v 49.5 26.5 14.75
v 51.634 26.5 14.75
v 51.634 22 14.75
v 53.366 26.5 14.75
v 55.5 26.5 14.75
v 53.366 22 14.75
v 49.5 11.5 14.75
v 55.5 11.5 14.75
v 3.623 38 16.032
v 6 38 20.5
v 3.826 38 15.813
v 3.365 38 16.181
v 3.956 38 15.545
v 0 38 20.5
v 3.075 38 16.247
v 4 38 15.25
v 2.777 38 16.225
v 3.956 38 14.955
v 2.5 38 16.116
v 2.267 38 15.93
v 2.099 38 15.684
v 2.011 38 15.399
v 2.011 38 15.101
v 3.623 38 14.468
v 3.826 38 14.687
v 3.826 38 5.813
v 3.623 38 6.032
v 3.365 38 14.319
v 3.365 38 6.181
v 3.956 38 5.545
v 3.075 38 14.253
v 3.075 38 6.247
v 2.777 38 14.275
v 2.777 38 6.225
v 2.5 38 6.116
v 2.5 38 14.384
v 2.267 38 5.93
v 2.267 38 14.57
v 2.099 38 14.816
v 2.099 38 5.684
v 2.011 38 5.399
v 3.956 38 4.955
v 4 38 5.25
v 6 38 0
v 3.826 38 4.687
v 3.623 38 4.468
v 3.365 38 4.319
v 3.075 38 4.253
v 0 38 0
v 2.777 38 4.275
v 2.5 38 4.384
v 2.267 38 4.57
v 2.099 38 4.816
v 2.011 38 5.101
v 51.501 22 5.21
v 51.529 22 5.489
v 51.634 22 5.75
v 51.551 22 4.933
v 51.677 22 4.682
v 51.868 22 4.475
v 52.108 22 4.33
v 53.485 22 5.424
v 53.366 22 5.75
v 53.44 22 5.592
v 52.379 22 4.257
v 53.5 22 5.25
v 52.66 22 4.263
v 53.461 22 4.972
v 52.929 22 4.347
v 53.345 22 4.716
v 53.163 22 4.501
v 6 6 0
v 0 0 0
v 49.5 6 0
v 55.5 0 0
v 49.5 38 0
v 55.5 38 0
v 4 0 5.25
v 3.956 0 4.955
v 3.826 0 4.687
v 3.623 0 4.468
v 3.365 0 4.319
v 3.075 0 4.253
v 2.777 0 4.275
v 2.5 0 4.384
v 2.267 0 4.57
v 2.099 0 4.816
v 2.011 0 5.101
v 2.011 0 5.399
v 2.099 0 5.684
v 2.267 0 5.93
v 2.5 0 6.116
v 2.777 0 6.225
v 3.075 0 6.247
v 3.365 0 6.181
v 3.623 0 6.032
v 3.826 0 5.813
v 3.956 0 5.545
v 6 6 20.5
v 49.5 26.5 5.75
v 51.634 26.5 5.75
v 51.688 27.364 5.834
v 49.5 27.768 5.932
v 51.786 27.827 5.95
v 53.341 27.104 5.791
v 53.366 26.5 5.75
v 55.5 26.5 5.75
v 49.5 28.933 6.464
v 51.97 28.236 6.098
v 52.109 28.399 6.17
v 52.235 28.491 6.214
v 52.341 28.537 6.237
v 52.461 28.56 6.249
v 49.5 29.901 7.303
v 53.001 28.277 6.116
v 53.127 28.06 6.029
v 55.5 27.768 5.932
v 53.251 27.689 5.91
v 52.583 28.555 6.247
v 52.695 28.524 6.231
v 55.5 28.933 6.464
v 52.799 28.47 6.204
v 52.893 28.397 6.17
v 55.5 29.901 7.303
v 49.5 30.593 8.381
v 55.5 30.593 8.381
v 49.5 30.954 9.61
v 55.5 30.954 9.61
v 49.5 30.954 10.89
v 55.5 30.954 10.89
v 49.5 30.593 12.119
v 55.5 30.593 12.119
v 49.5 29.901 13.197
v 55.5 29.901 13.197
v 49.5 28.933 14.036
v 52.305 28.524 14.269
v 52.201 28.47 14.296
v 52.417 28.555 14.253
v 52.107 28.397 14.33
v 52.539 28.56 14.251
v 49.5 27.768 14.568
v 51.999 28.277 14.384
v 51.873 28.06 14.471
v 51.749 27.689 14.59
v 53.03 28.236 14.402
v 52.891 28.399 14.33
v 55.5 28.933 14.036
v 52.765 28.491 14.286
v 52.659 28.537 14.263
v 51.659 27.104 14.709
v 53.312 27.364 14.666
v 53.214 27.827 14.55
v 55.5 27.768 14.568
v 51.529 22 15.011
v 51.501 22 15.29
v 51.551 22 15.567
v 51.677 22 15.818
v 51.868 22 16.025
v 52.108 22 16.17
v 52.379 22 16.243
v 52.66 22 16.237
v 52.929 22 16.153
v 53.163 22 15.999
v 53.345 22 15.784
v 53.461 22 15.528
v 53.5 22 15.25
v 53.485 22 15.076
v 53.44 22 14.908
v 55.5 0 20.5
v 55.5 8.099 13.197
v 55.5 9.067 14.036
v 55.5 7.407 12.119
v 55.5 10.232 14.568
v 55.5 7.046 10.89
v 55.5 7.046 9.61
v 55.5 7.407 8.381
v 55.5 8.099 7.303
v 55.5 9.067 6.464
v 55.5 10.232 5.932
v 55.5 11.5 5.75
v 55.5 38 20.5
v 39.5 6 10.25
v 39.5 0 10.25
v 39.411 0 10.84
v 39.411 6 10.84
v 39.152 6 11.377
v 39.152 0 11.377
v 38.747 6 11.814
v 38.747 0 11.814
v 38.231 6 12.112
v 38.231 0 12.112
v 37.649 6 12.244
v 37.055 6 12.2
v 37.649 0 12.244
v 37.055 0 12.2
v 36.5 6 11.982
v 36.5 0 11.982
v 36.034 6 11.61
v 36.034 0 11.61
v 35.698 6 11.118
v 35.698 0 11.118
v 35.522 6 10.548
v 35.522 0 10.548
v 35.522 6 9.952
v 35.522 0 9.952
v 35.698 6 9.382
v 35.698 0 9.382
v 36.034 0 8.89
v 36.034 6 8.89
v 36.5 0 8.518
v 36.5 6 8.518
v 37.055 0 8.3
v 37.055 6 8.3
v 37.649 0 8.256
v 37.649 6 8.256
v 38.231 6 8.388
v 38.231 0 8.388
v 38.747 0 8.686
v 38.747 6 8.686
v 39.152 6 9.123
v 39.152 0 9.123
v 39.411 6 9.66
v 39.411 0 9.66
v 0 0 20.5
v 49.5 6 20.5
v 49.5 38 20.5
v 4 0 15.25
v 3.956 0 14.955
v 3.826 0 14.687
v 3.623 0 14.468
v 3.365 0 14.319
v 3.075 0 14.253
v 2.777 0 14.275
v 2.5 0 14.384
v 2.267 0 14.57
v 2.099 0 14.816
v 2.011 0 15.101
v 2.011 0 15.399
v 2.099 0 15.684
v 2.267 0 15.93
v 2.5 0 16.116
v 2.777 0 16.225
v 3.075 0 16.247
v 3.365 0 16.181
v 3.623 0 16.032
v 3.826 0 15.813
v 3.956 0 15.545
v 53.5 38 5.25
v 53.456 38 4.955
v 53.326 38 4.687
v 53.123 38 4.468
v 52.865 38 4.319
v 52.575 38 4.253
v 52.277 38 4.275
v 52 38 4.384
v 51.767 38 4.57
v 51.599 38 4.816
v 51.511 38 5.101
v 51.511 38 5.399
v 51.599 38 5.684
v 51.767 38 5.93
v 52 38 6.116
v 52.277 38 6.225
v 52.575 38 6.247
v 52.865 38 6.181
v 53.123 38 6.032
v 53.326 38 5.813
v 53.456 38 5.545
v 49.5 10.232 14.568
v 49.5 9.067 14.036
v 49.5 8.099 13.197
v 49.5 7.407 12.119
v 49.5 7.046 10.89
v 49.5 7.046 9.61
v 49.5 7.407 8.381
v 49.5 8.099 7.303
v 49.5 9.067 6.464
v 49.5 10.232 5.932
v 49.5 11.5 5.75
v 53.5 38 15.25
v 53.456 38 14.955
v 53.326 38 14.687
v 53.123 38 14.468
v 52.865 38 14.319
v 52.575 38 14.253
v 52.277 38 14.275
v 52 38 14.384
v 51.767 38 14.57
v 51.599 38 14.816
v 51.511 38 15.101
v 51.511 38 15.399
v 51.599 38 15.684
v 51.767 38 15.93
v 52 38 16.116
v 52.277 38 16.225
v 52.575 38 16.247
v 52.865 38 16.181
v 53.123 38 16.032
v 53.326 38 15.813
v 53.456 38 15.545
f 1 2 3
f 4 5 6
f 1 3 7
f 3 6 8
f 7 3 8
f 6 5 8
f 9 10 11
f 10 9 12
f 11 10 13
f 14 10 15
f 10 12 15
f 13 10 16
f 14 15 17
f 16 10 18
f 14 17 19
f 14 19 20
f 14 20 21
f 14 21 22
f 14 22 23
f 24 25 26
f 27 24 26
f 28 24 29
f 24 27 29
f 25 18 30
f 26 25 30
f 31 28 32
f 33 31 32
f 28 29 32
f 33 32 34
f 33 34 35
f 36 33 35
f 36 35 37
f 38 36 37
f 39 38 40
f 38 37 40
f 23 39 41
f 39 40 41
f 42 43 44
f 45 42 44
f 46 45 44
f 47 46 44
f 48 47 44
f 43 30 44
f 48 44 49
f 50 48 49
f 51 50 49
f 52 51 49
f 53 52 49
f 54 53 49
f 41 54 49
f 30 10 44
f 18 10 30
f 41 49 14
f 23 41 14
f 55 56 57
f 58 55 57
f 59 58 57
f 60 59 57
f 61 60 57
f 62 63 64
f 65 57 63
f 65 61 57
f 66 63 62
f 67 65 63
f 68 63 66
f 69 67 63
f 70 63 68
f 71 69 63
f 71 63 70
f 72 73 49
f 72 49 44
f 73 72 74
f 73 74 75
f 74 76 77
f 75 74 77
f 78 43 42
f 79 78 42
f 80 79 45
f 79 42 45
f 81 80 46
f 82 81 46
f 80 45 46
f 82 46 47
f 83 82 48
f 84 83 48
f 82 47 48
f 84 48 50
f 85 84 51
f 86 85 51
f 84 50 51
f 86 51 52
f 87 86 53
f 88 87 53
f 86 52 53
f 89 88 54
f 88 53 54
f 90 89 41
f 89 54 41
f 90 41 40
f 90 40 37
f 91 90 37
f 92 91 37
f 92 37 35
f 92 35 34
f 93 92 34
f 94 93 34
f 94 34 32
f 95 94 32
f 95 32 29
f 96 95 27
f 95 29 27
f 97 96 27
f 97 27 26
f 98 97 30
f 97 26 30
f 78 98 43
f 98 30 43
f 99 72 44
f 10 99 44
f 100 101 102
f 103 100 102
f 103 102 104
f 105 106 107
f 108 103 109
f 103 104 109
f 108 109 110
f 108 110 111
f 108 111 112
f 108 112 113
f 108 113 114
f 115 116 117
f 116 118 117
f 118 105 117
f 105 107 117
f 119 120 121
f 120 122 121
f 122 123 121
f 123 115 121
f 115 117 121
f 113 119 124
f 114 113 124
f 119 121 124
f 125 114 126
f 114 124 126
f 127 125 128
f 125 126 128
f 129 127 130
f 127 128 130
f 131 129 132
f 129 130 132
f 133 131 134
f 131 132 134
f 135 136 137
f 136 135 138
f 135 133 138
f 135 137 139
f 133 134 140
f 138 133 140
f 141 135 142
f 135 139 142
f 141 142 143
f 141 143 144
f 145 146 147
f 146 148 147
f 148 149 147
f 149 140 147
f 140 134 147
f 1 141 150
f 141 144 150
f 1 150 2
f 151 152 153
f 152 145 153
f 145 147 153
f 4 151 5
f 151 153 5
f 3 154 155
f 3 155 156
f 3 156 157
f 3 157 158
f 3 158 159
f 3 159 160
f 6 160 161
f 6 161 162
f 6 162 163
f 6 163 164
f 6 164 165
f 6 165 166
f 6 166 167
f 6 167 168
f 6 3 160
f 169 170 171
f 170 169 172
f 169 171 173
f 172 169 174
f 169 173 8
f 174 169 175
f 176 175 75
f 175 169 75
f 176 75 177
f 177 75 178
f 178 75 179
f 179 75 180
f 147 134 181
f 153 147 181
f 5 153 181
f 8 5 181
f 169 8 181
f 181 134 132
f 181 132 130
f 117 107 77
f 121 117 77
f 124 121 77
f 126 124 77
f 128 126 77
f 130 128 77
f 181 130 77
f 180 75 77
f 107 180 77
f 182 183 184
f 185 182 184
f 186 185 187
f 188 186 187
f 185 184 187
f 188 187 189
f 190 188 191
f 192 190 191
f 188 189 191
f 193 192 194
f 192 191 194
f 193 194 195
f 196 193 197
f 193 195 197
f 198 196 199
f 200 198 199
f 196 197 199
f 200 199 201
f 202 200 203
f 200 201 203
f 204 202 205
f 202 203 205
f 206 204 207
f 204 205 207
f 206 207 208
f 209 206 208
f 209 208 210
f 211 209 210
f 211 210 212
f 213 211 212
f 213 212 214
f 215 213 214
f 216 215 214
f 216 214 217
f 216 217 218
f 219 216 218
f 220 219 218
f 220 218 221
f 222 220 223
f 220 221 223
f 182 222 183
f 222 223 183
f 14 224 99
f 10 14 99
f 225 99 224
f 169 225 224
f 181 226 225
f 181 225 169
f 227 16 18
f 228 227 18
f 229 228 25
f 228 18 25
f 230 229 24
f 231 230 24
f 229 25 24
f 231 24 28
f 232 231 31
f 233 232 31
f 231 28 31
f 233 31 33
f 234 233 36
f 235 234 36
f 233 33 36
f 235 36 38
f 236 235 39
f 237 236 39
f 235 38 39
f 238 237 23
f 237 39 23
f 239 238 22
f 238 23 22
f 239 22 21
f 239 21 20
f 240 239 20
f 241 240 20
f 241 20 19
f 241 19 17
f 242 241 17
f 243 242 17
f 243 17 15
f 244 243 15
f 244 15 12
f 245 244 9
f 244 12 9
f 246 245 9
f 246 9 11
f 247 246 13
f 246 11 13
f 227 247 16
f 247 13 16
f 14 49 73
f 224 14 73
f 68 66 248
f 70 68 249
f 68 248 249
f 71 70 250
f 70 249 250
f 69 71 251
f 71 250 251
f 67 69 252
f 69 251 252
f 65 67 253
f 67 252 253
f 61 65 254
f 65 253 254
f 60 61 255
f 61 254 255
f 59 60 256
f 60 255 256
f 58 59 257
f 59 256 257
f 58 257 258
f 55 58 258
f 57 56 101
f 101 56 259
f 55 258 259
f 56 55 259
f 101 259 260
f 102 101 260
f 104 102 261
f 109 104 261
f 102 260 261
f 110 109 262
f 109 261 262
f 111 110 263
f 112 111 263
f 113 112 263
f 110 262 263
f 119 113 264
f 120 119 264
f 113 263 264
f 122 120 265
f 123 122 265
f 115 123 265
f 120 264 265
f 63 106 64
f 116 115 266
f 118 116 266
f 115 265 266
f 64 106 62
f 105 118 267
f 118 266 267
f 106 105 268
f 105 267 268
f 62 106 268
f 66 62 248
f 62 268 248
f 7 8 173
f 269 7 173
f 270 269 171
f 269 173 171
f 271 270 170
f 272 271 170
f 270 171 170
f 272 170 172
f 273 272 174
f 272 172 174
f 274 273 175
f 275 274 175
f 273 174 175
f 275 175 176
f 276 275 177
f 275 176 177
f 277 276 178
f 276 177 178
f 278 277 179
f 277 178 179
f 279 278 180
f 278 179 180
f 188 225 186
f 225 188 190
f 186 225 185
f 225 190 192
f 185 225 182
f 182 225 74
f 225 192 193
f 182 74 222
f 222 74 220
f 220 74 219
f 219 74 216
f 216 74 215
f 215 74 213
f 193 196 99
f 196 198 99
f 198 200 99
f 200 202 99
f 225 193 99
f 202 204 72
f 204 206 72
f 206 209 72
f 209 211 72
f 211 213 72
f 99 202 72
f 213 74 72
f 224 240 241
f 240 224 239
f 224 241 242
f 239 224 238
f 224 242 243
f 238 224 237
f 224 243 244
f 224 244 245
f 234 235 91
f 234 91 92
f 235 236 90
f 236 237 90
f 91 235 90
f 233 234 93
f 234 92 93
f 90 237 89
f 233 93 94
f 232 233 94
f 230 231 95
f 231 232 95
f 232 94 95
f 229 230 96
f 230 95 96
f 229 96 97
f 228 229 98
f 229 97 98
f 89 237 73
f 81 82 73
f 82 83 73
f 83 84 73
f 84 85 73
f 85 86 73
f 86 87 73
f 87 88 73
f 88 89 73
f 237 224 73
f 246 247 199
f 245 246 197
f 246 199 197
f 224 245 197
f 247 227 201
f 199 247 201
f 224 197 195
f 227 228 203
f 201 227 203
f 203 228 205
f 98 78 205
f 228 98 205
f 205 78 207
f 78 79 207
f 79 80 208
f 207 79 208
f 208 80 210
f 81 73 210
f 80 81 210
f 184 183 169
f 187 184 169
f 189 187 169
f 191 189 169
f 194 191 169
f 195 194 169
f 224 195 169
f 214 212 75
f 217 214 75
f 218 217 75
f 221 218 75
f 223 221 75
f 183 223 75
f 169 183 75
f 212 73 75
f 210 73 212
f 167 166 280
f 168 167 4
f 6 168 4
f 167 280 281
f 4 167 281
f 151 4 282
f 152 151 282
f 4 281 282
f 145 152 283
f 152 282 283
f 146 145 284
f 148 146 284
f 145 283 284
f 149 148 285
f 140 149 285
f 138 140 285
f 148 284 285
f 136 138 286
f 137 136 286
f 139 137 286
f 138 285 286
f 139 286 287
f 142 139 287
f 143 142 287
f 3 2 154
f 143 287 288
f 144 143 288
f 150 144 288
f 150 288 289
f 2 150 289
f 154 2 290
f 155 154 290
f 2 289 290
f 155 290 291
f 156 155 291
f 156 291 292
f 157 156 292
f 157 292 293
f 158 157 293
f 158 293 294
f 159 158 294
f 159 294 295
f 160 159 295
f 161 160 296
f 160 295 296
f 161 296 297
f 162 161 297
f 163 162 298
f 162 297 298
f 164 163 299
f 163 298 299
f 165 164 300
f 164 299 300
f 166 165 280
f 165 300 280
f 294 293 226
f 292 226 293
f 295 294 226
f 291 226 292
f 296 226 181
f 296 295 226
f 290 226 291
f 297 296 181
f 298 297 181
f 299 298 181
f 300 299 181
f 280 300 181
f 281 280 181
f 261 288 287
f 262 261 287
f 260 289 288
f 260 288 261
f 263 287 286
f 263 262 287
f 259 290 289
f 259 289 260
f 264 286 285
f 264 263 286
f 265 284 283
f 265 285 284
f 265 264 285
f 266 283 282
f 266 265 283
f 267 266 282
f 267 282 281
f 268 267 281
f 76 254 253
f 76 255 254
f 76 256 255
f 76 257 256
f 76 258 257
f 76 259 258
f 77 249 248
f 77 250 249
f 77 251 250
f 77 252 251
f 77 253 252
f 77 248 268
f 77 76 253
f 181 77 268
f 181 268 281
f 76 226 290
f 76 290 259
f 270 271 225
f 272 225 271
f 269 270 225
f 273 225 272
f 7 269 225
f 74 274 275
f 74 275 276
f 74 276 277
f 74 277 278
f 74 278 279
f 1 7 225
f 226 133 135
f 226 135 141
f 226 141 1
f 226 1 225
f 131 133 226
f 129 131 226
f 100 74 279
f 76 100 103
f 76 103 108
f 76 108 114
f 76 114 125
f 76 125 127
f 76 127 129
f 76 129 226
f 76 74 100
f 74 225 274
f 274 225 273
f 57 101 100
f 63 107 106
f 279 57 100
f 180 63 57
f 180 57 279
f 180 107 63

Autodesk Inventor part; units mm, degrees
ref_plane "YZ Plane" through (0, 0, 0) normal (1, 0, 0) x (0, 1, 0)
ref_plane "XZ Plane" through (0, 0, 0) normal (0, 1, 0) x (-1, 0, 0)
ref_plane "XY Plane" through (0, 0, 0) normal (0, 0, 1) x (1, 0, 0)
sketch "Эскиз1" plane through (0, 0, 0) normal (0, 0, 1) x (1, 0, 0)
  line L0 (0, 0) -> (55.5, 0)
  line L1 (55.5, 0) -> (55.5, 6)
  line L2 (55.5, 6) -> (0, 6)
  line L3 (0, 6) -> (0, 0)
  line L4 (0, 6) -> (6, 6)
  line L5 (6, 6) -> (6, 38)
  line L6 (6, 38) -> (0, 38)
  line L7 (0, 38) -> (0, 6)
  line L8 (55.5, 6) -> (49.5, 6)
  line L9 (49.5, 6) -> (49.5, 38)
  line L10 (49.5, 38) -> (55.5, 38)
  line L11 (55.5, 38) -> (55.5, 6)
  dimension "d0" = 38
  dimension "d1" = 6
  dimension "d2" = 6
  dimension "d3" = 6
  dimension "d4" = 38
  dimension "d5" = 55.5
extrude "Выдавливание1" add sketch "Эскиз1" along normal blind 20.5
sketch "Эскиз2" plane through (55.5, 0, 0) normal (1, 0, 0) x (0, 0, -1)
  circle A0 centre (-10.25, 26.5) radius 4.5
  circle A1 centre (-10.25, 11.5) radius 4.5
  line L0 (-5.75, 26.5) -> (-5.75, 11.5)
  line L1 (-14.75, 26.5) -> (-14.75, 11.5)
  line L2 (0, 0) -> (-20.5, 0) projected
  point P0 (-10.25, 0)
  dimension "d8" = 9
  dimension "d9" = 11.5
  dimension "d10" = 24
extrude "Выдавливание2" cut sketch "Эскиз2" against normal up to next
sketch "Эскиз3" plane through (0, 0, 0) normal (0, -1, 0) x (1, 0, 0)
  circle A0 centre (37.5, 10.25) radius 2
  line L0 (55.5, 0) -> (55.5, 20.5) projected
  point P0 (0, 0)
  point P1 (55.5, 10.25)
  dimension "d13" = 4
  dimension "d14" = 18
extrude "Выдавливание3" cut sketch "Эскиз3" against normal up to next
sketch "Эскиз4" plane through (49.5, 38, 0) normal (0, 1, 0) x (1, 0, 0)
  circle A0 centre (3, -15.25) radius 1
  circle A1 centre (3, -5.25) radius 1
  line L0 (0, 0) -> (0, -20.5) projected
  line L1 (6, -20.5) -> (0, -20.5) projected
  line L2 (3, -5.25) -> (3, -15.25) construction
  point P0 (-49.5, 0)
  point P1 (3, -10.25)
  point P2 (0, -10.25)
  dimension "d17" = 2
  dimension "d18" = 10
  dimension "d19" = 2
extrude "Выдавливание4" cut sketch "Эскиз4" against normal blind 16
sketch "Эскиз5" plane through (0, 38, 0) normal (0, 1, 0) x (1, 0, 0)
  circle A0 centre (3, -5.25) radius 1
  circle A1 centre (3, -15.25) radius 1
  circle A2 centre (52.5, -5.25) radius 1 projected
  circle A3 centre (52.5, -15.25) radius 1 projected
  line L0 (6, 0) -> (0, 0) projected
  point P0 (3, 0)
  dimension "d23" = 2
extrude "Выдавливание5" cut sketch "Эскиз5" against normal up to next contours A0 | A1
sketch "Эскиз6" plane through (0, 0, 20.5) normal (0, 0, 1) x (1, 0, 0)
  point P0 (0, 0)
properties part number "kreplenie2"
